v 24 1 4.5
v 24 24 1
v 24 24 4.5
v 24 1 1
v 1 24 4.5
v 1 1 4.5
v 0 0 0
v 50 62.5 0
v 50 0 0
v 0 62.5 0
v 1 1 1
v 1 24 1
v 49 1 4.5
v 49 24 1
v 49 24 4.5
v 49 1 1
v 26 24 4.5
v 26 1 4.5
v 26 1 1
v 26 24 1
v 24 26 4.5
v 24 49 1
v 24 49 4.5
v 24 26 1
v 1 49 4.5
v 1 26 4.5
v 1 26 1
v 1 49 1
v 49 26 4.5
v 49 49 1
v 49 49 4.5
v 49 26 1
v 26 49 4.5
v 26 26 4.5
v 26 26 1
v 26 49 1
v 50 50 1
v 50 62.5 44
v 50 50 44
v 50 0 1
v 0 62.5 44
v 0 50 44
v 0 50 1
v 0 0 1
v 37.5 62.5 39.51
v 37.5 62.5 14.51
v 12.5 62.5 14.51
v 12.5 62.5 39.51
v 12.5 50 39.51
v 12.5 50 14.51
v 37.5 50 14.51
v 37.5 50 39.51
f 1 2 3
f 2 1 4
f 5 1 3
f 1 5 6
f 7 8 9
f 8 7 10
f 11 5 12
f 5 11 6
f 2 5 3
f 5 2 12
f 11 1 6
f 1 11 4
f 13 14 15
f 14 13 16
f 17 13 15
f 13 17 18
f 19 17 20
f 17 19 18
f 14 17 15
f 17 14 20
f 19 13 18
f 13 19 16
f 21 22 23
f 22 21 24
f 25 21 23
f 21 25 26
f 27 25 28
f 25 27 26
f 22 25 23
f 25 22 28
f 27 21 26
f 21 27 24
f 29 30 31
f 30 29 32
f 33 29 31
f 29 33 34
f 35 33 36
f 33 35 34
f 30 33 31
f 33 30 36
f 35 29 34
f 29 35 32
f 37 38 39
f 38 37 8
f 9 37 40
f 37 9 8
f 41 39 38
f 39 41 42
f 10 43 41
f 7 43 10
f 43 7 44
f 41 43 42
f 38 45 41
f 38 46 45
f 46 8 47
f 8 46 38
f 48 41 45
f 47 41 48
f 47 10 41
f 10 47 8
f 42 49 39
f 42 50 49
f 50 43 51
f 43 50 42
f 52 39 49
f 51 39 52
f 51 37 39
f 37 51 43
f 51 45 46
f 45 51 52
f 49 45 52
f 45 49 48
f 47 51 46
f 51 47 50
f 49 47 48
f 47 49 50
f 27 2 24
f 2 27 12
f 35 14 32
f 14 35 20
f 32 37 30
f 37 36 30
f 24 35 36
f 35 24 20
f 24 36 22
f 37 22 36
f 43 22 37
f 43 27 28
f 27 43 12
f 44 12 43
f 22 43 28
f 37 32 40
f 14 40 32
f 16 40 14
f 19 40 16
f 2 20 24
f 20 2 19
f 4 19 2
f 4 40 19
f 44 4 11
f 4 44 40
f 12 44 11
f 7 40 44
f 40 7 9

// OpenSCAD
color("LightGray") {
    translate([1,1,0]) cube([23,23,4.5]);
    translate([25+1,1,0]) cube([23,23,4.5]);
    translate([1,25+1,0]) cube([23,23,4.5]);
    translate([25+1,25+1,0]) cube([23,23,4.5]);
}
color("Grey") {
    cube([50,50,1]);
    difference() {
        translate([0,50,0]) cube([50,12.5,50-6]);
        translate([12.5,25,4.51+10]) cube([25,50,25]);
    }
}
